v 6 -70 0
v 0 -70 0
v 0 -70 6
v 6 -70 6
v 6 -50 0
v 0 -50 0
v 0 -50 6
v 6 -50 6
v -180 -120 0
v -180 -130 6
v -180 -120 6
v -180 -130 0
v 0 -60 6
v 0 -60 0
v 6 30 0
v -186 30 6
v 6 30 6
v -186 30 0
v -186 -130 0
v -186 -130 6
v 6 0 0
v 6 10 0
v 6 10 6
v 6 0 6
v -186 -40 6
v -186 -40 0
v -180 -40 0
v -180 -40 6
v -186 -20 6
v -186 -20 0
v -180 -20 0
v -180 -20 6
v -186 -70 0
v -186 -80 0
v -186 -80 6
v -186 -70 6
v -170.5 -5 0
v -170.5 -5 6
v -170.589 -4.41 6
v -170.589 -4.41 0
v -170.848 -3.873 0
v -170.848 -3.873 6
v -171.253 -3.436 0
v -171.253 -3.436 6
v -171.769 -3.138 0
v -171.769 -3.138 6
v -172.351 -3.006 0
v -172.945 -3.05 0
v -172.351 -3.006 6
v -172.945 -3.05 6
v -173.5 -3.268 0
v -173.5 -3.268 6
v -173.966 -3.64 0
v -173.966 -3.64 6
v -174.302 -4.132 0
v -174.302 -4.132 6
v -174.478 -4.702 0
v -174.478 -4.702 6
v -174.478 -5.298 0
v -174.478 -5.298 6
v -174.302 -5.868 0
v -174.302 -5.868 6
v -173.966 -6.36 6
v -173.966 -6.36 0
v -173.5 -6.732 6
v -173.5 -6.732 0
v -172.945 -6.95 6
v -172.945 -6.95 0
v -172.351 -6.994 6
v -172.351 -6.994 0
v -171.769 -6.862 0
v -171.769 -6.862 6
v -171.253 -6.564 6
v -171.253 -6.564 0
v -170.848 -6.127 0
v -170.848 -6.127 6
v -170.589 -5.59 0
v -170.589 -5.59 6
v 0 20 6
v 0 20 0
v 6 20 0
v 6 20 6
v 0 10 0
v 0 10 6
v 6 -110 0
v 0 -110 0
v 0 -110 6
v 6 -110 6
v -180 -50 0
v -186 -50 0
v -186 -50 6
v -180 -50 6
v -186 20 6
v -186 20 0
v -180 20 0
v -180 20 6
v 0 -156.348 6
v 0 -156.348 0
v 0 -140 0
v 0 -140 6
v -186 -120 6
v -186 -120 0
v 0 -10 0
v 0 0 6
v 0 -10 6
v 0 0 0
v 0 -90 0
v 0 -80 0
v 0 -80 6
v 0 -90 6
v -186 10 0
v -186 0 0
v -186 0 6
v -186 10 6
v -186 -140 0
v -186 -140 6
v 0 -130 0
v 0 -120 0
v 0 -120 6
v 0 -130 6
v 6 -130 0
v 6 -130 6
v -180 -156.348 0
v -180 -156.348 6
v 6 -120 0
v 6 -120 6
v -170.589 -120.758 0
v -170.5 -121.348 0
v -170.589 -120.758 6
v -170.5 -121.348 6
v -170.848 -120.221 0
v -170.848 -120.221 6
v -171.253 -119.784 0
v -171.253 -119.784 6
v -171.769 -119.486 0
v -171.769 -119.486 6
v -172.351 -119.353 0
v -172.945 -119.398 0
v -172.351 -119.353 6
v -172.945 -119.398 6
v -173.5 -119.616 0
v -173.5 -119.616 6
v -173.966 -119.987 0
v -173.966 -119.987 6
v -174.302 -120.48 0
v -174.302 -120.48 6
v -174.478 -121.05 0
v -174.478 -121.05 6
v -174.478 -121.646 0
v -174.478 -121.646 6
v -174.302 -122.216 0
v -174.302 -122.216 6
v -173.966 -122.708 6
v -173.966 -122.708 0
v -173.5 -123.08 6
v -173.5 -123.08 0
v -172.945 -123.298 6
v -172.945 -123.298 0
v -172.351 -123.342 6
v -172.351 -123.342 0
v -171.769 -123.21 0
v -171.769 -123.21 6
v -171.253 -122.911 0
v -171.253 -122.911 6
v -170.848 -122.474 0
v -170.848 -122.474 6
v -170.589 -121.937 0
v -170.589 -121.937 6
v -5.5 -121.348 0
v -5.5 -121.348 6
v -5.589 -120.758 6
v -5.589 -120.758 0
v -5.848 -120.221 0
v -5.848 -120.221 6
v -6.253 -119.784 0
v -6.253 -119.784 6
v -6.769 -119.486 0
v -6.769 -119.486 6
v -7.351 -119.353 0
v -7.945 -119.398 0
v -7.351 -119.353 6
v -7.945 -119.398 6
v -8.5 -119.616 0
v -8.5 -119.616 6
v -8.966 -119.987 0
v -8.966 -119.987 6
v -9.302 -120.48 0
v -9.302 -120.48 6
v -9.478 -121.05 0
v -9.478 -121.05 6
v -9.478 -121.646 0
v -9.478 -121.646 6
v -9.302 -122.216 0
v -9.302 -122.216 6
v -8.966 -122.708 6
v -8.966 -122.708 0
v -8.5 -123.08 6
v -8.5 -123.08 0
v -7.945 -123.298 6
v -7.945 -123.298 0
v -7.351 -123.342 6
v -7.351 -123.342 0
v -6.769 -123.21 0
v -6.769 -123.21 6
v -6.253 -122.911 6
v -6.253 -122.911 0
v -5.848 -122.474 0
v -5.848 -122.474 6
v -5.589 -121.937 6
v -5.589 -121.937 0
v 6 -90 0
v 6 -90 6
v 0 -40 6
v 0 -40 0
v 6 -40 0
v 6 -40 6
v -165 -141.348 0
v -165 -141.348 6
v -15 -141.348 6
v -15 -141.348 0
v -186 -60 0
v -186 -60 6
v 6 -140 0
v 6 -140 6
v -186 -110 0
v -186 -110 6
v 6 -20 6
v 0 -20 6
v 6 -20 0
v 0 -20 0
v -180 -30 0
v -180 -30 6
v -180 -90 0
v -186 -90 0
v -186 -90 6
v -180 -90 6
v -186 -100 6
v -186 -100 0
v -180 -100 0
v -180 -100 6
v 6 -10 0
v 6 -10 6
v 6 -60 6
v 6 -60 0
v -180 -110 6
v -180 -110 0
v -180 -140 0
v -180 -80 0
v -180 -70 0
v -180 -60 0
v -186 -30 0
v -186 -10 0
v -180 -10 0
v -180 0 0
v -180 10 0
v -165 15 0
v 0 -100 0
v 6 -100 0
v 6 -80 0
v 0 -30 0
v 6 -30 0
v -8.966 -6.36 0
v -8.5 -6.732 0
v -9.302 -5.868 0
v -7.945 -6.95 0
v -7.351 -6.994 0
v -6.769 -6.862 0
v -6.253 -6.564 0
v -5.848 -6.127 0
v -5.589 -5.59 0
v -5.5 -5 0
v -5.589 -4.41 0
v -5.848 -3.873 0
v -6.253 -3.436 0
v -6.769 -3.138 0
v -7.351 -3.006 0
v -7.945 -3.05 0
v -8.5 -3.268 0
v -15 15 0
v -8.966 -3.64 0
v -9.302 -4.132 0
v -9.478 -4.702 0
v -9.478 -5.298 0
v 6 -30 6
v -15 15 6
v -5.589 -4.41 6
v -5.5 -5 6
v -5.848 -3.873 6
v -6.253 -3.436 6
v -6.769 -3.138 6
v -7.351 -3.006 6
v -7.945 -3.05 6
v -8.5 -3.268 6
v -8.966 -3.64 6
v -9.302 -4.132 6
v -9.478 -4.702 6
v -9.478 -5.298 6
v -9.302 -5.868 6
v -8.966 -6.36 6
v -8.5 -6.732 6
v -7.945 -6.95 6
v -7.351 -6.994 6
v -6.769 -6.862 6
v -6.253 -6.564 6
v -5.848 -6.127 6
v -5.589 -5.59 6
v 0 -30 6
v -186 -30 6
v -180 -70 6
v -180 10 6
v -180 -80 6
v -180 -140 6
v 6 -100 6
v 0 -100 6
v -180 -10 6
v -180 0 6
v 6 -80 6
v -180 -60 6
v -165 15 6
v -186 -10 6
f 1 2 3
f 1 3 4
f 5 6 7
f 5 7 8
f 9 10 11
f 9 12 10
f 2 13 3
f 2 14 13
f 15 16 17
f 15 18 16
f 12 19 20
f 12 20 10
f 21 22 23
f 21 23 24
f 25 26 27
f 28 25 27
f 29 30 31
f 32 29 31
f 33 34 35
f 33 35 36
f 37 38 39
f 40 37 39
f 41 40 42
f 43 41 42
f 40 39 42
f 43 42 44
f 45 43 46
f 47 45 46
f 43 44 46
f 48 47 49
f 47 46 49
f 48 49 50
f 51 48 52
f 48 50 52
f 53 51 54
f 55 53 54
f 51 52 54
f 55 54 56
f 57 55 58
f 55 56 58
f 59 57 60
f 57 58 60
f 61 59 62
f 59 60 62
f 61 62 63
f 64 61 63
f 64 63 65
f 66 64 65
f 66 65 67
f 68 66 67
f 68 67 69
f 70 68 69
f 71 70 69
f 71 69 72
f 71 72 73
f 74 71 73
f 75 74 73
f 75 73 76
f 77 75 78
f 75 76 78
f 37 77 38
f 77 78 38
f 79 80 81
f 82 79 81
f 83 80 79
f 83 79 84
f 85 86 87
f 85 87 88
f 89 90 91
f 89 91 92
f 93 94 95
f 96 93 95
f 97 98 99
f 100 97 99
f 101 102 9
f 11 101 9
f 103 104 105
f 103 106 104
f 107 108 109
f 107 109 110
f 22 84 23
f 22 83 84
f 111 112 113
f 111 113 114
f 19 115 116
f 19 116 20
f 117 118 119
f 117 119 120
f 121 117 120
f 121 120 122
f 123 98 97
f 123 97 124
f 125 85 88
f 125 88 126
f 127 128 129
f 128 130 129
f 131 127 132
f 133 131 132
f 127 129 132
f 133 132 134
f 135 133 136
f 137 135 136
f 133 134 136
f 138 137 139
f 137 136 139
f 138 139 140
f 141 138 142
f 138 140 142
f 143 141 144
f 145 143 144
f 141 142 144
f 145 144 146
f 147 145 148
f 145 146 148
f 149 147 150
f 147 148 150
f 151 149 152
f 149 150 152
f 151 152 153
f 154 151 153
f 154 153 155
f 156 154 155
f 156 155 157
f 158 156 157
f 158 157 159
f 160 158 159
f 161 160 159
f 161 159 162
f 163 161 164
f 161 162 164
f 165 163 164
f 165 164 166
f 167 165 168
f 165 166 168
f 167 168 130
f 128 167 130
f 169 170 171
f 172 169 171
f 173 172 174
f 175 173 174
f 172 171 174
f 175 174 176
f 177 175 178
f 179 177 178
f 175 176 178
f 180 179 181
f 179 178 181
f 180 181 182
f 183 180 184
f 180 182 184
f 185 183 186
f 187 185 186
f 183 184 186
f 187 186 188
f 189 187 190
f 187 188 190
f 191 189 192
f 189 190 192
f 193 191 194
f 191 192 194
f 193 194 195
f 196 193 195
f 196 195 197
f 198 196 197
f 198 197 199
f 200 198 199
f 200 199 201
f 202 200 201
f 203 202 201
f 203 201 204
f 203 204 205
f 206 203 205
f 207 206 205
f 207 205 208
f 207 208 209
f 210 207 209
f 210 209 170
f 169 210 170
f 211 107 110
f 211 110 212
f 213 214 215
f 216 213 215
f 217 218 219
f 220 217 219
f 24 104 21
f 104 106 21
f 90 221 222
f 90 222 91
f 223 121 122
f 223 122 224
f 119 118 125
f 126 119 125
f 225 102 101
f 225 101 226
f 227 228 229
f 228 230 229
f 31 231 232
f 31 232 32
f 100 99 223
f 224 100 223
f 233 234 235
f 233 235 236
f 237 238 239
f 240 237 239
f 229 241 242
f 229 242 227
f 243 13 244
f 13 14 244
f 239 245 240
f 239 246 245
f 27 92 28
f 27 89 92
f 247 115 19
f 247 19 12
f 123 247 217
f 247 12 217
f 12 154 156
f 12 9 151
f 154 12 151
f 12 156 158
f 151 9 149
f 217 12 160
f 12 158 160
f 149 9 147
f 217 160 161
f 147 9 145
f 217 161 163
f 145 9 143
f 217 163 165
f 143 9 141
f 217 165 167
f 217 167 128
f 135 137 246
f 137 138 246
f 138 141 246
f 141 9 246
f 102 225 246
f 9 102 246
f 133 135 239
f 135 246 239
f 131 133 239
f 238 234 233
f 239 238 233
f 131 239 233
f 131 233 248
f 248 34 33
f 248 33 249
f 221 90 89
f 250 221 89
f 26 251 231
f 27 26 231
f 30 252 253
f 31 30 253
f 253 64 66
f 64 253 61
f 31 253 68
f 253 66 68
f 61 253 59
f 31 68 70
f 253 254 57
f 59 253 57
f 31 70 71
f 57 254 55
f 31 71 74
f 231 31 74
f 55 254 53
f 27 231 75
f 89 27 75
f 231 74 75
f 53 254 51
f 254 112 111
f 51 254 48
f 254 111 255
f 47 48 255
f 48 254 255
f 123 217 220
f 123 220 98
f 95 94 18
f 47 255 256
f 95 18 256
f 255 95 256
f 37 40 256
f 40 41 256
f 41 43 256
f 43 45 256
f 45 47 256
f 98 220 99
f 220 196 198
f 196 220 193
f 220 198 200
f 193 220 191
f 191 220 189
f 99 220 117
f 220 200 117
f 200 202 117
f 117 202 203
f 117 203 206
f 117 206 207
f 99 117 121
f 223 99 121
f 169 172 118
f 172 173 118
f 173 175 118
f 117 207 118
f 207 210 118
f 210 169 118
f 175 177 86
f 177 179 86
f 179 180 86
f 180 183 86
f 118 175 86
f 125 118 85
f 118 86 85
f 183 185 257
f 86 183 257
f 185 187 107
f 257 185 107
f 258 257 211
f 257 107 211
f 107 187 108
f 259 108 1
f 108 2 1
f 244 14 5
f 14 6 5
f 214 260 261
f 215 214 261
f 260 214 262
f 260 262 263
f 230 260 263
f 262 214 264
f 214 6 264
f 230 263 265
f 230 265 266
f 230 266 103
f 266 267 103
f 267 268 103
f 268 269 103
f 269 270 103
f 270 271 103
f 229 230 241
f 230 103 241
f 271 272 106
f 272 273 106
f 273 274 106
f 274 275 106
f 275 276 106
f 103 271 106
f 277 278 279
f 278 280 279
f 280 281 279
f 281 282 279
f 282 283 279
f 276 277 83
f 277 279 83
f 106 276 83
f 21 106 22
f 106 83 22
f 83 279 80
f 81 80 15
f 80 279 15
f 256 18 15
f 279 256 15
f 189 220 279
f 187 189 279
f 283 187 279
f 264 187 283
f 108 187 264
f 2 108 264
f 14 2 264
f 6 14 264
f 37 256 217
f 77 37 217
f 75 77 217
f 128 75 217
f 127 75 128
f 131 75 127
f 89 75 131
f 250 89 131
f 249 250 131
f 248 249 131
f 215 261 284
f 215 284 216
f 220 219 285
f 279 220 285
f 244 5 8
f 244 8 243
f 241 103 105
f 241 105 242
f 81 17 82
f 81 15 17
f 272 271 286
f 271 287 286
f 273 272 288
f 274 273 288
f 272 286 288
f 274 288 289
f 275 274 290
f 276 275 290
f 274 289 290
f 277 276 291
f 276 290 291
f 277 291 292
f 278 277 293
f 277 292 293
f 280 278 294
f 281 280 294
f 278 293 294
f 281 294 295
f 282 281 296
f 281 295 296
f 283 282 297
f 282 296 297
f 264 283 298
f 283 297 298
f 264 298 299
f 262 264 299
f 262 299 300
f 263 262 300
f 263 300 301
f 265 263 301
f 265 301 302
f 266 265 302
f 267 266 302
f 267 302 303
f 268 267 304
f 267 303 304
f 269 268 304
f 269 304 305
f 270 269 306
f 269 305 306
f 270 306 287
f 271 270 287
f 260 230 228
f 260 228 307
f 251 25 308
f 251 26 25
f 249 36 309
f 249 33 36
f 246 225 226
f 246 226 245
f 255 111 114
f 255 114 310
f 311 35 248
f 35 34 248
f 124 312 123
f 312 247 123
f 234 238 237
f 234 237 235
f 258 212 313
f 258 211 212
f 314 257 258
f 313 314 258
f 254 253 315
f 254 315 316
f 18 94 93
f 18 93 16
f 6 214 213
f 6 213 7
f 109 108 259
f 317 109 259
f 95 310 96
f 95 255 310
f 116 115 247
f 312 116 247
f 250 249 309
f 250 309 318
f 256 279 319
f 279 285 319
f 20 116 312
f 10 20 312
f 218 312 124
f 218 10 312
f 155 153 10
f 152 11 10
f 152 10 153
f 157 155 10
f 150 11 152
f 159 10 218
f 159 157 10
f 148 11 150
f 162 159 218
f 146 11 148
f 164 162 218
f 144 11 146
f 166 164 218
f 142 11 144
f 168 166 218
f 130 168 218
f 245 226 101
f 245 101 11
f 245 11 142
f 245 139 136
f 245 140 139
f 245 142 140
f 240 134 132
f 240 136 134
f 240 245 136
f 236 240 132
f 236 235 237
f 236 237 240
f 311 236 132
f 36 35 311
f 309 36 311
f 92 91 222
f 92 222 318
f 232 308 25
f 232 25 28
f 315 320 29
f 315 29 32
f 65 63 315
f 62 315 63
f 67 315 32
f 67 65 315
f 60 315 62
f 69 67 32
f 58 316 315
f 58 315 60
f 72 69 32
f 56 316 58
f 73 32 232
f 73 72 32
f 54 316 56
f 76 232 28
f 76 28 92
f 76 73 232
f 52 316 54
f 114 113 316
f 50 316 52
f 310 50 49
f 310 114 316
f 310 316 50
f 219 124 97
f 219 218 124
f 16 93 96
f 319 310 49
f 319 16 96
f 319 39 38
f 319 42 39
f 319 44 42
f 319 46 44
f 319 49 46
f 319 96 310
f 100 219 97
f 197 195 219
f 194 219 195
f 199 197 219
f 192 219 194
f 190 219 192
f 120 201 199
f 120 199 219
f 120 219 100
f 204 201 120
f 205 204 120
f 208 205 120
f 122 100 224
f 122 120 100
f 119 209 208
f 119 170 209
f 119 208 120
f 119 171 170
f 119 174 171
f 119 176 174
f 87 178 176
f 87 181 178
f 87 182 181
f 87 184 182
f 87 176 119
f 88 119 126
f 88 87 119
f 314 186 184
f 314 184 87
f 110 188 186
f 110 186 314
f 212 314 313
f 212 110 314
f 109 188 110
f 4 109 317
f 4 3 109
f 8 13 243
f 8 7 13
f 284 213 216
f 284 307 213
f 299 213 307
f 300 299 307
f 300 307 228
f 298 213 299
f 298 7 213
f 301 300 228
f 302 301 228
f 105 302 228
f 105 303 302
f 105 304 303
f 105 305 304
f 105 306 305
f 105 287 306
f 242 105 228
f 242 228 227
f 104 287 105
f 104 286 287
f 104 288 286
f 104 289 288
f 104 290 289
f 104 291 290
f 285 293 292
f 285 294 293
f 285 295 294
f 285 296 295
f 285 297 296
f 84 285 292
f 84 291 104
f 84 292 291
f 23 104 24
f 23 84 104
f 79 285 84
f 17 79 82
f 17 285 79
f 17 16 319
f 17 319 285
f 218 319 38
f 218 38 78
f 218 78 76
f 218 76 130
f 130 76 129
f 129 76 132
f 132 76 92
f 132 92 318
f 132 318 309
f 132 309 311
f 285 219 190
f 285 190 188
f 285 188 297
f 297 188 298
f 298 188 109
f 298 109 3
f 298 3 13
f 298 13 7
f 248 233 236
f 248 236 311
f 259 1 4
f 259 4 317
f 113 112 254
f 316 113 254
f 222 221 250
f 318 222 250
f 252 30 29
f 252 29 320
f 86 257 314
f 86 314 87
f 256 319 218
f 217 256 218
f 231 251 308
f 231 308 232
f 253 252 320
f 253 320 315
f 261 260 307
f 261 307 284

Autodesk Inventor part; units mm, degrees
ref_plane "YZ Plane" through (0, 0, 0) normal (1, 0, 0) x (0, 1, 0)
ref_plane "XZ Plane" through (0, 0, 0) normal (0, 1, 0) x (-1, 0, 0)
ref_plane "XY Plane" through (0, 0, 0) normal (0, 0, 1) x (1, 0, 0)
sketch "Эскиз1" plane through (0, 0, 0) normal (0, 0, 1) x (1, 0, 0)
  line L0 (0, 20) -> (0, 30) projected
  line L1 (0, 20) -> (6, 20) projected
  line L2 (6, 30) -> (6, 20) projected
  line L3 (0, 30) -> (6, 30) projected
  line L4 (0, 0) -> (0, 10) projected
  line L5 (0, 0) -> (6, 0) projected
  line L6 (6, 10) -> (6, 0) projected
  line L7 (0, 10) -> (6, 10) projected
  line L8 (0, -20) -> (0, -10) projected
  line L9 (0, -20) -> (6, -20) projected
  line L10 (6, -10) -> (6, -20) projected
  line L11 (0, -10) -> (6, -10) projected
  line L12 (0, -40) -> (0, -30) projected
  line L13 (0, -40) -> (6, -40) projected
  line L14 (6, -30) -> (6, -40) projected
  line L15 (0, -30) -> (6, -30) projected
  line L16 (0, -60) -> (0, -50) projected
  line L17 (0, -60) -> (6, -60) projected
  line L18 (6, -50) -> (6, -60) projected
  line L19 (0, -50) -> (6, -50) projected
  line L20 (0, -80) -> (0, -70) projected
  line L21 (0, -80) -> (6, -80) projected
  line L22 (6, -70) -> (6, -80) projected
  line L23 (0, -70) -> (6, -70) projected
  line L24 (0, -100) -> (0, -90) projected
  line L25 (0, -100) -> (6, -100) projected
  line L26 (6, -90) -> (6, -100) projected
  line L27 (0, -90) -> (6, -90) projected
  line L28 (0, -120) -> (0, -110) projected
  line L29 (0, -120) -> (6, -120) projected
  line L30 (6, -110) -> (6, -120) projected
  line L31 (0, -110) -> (6, -110) projected
  line L32 (0, -140) -> (0, -130) projected
  line L33 (0, -140) -> (6, -140) projected
  line L34 (6, -130) -> (6, -140) projected
  line L35 (0, -130) -> (6, -130) projected
  line L36 (0, -156.3478) -> (0, -140) projected
  line L37 (-180, -140) -> (-180, -156.3478) projected
  line L38 (-186, -140) -> (-186, -130) projected
  line L39 (-186, -140) -> (-180, -140) projected
  line L40 (-180, -130) -> (-180, -140) projected
  line L41 (-186, -130) -> (-180, -130) projected
  line L42 (-186, -120) -> (-186, -110) projected
  line L43 (-186, -120) -> (-180, -120) projected
  line L44 (-180, -110) -> (-180, -120) projected
  line L45 (-186, -110) -> (-180, -110) projected
  line L46 (-186, -100) -> (-186, -90) projected
  line L47 (-186, -100) -> (-180, -100) projected
  line L48 (-180, -90) -> (-180, -100) projected
  line L49 (-186, -90) -> (-180, -90) projected
  line L50 (-186, -80) -> (-186, -70) projected
  line L51 (-186, -80) -> (-180, -80) projected
  line L52 (-180, -70) -> (-180, -80) projected
  line L53 (-186, -70) -> (-180, -70) projected
  line L54 (-186, -60) -> (-186, -50) projected
  line L55 (-186, -60) -> (-180, -60) projected
  line L56 (-180, -50) -> (-180, -60) projected
  line L57 (-186, -50) -> (-180, -50) projected
  line L58 (-186, -40) -> (-186, -30) projected
  line L59 (-186, -40) -> (-180, -40) projected
  line L60 (-180, -30) -> (-180, -40) projected
  line L61 (-186, -30) -> (-180, -30) projected
  line L62 (-186, 20) -> (-186, 30) projected
  line L63 (-186, 20) -> (-180, 20) projected
  line L64 (-180, 30) -> (-180, 20) projected
  line L65 (-186, 30) -> (-180, 30) projected
  line L66 (-186, 0) -> (-186, 10) projected
  line L67 (-186, 0) -> (-180, 0) projected
  line L68 (-180, 10) -> (-180, 0) projected
  line L69 (-186, 10) -> (-180, 10) projected
  line L70 (-186, -20) -> (-186, -10) projected
  line L71 (-186, -20) -> (-180, -20) projected
  line L72 (-180, -10) -> (-180, -20) projected
  line L73 (-186, -10) -> (-180, -10) projected
  line L74 (0, -156.3478) -> (-180, -156.3478)
  line L75 (-180, -156.3478) -> (-180, 30)
  line L76 (-180, 30) -> (0, 30)
  line L77 (0, 30) -> (0, -156.3478)
extrude "Выдавливание1" add sketch "Эскиз1" along normal blind 6
sketch "Эскиз2" plane through (0, 0, 6) normal (0, 0, 1) x (1, 0, 0)
  line L0 (-15, 15) -> (-165, 15)
  line L1 (-165, 15) -> (-165, -141.3478)
  line L2 (-165, -141.3478) -> (-15, -141.3478)
  line L3 (-15, -141.3478) -> (-15, 15)
  line L4 (-186, 10) -> (-186, 0) projected
  line L5 (-186, 0) -> (-180, 0) projected
  line L6 (-180, 0) -> (-180, -10) projected
  line L7 (-180, -10) -> (-186, -10) projected
  line L8 (-186, -10) -> (-186, -20) projected
  line L9 (-186, -20) -> (-180, -20) projected
  line L10 (-180, -20) -> (-180, -30) projected
  line L11 (-180, -30) -> (-186, -30) projected
  line L12 (-186, -30) -> (-186, -40) projected
  line L13 (-186, -40) -> (-180, -40) projected
  line L14 (-180, -40) -> (-180, -50) projected
  line L15 (-180, -50) -> (-186, -50) projected
  line L16 (-186, -50) -> (-186, -60) projected
  line L17 (-186, -60) -> (-180, -60) projected
  line L18 (-180, -60) -> (-180, -70) projected
  line L19 (-180, -70) -> (-186, -70) projected
  line L20 (-186, -70) -> (-186, -80) projected
  line L21 (-186, -80) -> (-180, -80) projected
  line L22 (-180, -80) -> (-180, -90) projected
  line L23 (-180, -90) -> (-186, -90) projected
  line L24 (-186, -90) -> (-186, -100) projected
  line L25 (-186, -100) -> (-180, -100) projected
  line L26 (-180, -100) -> (-180, -110) projected
  line L27 (-180, -110) -> (-186, -110) projected
  line L28 (-186, -110) -> (-186, -120) projected
  line L29 (-186, -120) -> (-180, -120) projected
  line L30 (-180, -120) -> (-180, -130) projected
  line L31 (-180, -130) -> (-186, -130) projected
  line L32 (-186, -130) -> (-186, -140) projected
  line L33 (-186, -140) -> (-180, -140) projected
  line L34 (-180, -140) -> (-180, -156.3478) projected
  line L35 (-180, -156.3478) -> (0, -156.3478) projected
  line L36 (0, -156.3478) -> (0, -140) projected
  line L37 (0, -140) -> (6, -140) projected
  line L38 (6, -140) -> (6, -130) projected
  line L39 (6, -130) -> (0, -130) projected
  line L40 (0, -130) -> (0, -120) projected
  line L41 (0, -120) -> (6, -120) projected
  line L42 (6, -120) -> (6, -110) projected
  line L43 (6, -110) -> (0, -110) projected
  line L44 (0, -110) -> (0, -100) projected
  line L45 (0, -100) -> (6, -100) projected
  line L46 (6, -100) -> (6, -90) projected
  line L47 (6, -90) -> (0, -90) projected
  line L48 (0, -90) -> (0, -80) projected
  line L49 (0, -80) -> (6, -80) projected
  line L50 (6, -80) -> (6, -70) projected
  line L51 (6, -70) -> (0, -70) projected
  line L52 (0, -70) -> (0, -60) projected
  line L53 (0, -60) -> (6, -60) projected
  line L54 (6, -60) -> (6, -50) projected
  line L55 (6, -50) -> (0, -50) projected
  line L56 (0, -50) -> (0, -40) projected
  line L57 (0, -40) -> (6, -40) projected
  line L58 (6, -40) -> (6, -30) projected
  line L59 (6, -30) -> (0, -30) projected
  line L60 (0, -30) -> (0, -20) projected
  line L61 (0, -20) -> (6, -20) projected
  line L62 (6, -20) -> (6, -10) projected
  line L63 (6, -10) -> (0, -10) projected
  line L64 (0, -10) -> (0, 0) projected
  line L65 (0, 0) -> (6, 0) projected
  line L66 (6, 0) -> (6, 10) projected
  line L67 (6, 10) -> (0, 10) projected
  line L68 (0, 10) -> (0, 20) projected
  line L69 (0, 20) -> (6, 20) projected
  line L70 (6, 20) -> (6, 30) projected
  line L71 (6, 30) -> (-186, 30) projected
  line L72 (-186, 30) -> (-186, 20) projected
  line L73 (-186, 20) -> (-180, 20) projected
  line L74 (-180, 20) -> (-180, 10) projected
  line L75 (-180, 10) -> (-186, 10) projected
  dimension "d2" = 15
  dimension "d3" = 15
  dimension "d4" = 15
  dimension "d5" = 15
extrude "Выдавливание2" cut sketch "Эскиз2" against normal blind 6 contours L3 L2 L1 L0
sketch "Эскиз3" plane through (0, 0, 6) normal (0, 0, 1) x (1, 0, 0)
  circle A0 centre (-172.5, -121.3478) radius 2
  line L0 (-165, -141.3478) -> (-165, 15) projected
  line L1 (-165, 15) -> (-15, 15) projected
  line L2 (-15, 15) -> (-15, -141.3478) projected
  line L3 (-15, -141.3478) -> (-165, -141.3478) projected
  line L4 (-186, 10) -> (-186, 0) projected
  line L5 (-186, 0) -> (-180, 0) projected
  line L6 (-180, 0) -> (-180, -10) projected
  line L7 (-180, -10) -> (-186, -10) projected
  line L8 (-186, -10) -> (-186, -20) projected
  line L9 (-186, -20) -> (-180, -20) projected
  line L10 (-180, -20) -> (-180, -30) projected
  line L11 (-180, -30) -> (-186, -30) projected
  line L12 (-186, -30) -> (-186, -40) projected
  line L13 (-186, -40) -> (-180, -40) projected
  line L14 (-180, -40) -> (-180, -50) projected
  line L15 (-180, -50) -> (-186, -50) projected
  line L16 (-186, -50) -> (-186, -60) projected
  line L17 (-186, -60) -> (-180, -60) projected
  line L18 (-180, -60) -> (-180, -70) projected
  line L19 (-180, -70) -> (-186, -70) projected
  line L20 (-186, -70) -> (-186, -80) projected
  line L21 (-186, -80) -> (-180, -80) projected
  line L22 (-180, -80) -> (-180, -90) projected
  line L23 (-180, -90) -> (-186, -90) projected
  line L24 (-186, -90) -> (-186, -100) projected
  line L25 (-186, -100) -> (-180, -100) projected
  line L26 (-180, -100) -> (-180, -110) projected
  line L27 (-180, -110) -> (-186, -110) projected
  line L28 (-186, -110) -> (-186, -120) projected
  line L29 (-186, -120) -> (-180, -120) projected
  line L30 (-180, -120) -> (-180, -130) projected
  line L31 (-180, -130) -> (-186, -130) projected
  line L32 (-186, -130) -> (-186, -140) projected
  line L33 (-186, -140) -> (-180, -140) projected
  line L34 (-180, -140) -> (-180, -156.3478) projected
  line L35 (-180, -156.3478) -> (0, -156.3478) projected
  line L36 (0, -156.3478) -> (0, -140) projected
  line L37 (0, -140) -> (6, -140) projected
  line L38 (6, -140) -> (6, -130) projected
  line L39 (6, -130) -> (0, -130) projected
  line L40 (0, -130) -> (0, -120) projected
  line L41 (0, -120) -> (6, -120) projected
  line L42 (6, -120) -> (6, -110) projected
  line L43 (6, -110) -> (0, -110) projected
  line L44 (0, -110) -> (0, -100) projected
  line L45 (0, -100) -> (6, -100) projected
  line L46 (6, -100) -> (6, -90) projected
  line L47 (6, -90) -> (0, -90) projected
  line L48 (0, -90) -> (0, -80) projected
  line L49 (0, -80) -> (6, -80) projected
  line L50 (6, -80) -> (6, -70) projected
  line L51 (6, -70) -> (0, -70) projected
  line L52 (0, -70) -> (0, -60) projected
  line L53 (0, -60) -> (6, -60) projected
  line L54 (6, -60) -> (6, -50) projected
  line L55 (6, -50) -> (0, -50) projected
  line L56 (0, -50) -> (0, -40) projected
  line L57 (0, -40) -> (6, -40) projected
  line L58 (6, -40) -> (6, -30) projected
  line L59 (6, -30) -> (0, -30) projected
  line L60 (0, -30) -> (0, -20) projected
  line L61 (0, -20) -> (6, -20) projected
  line L62 (6, -20) -> (6, -10) projected
  line L63 (6, -10) -> (0, -10) projected
  line L64 (0, -10) -> (0, 0) projected
  line L65 (0, 0) -> (6, 0) projected
  line L66 (6, 0) -> (6, 10) projected
  line L67 (6, 10) -> (0, 10) projected
  line L68 (0, 10) -> (0, 20) projected
  line L69 (0, 20) -> (6, 20) projected
  line L70 (6, 20) -> (6, 30) projected
  line L71 (6, 30) -> (-186, 30) projected
  line L72 (-186, 30) -> (-186, 20) projected
  line L73 (-186, 20) -> (-180, 20) projected
  line L74 (-180, 20) -> (-180, 10) projected
  line L75 (-180, 10) -> (-186, 10) projected
  circle A1 centre (-172.5, -5) radius 2
  circle A2 centre (-7.5, -5) radius 2
  circle A3 centre (-7.5, -121.3478) radius 2
  dimension "d8" = 4
  dimension "d9" = 20
  dimension "d10" = 15
  dimension "d11" = 7.5
  dimension "d12" = 4
  dimension "d13" = 20
  dimension "d14" = 7.5
  dimension "d15" = 4
  dimension "d16" = 4
  dimension "d17" = 20
  dimension "d18" = 20
  dimension "d19" = 7.5
  dimension "d20" = 7.5
extrude "Выдавливание3" cut sketch "Эскиз3" against normal blind 10 contours A0 | A1 | A2 | A3
equation "\"d13\" = d9"
equation "\"d19\" = d11"
equation "\"d20\" = d19"
properties part number "верх"
